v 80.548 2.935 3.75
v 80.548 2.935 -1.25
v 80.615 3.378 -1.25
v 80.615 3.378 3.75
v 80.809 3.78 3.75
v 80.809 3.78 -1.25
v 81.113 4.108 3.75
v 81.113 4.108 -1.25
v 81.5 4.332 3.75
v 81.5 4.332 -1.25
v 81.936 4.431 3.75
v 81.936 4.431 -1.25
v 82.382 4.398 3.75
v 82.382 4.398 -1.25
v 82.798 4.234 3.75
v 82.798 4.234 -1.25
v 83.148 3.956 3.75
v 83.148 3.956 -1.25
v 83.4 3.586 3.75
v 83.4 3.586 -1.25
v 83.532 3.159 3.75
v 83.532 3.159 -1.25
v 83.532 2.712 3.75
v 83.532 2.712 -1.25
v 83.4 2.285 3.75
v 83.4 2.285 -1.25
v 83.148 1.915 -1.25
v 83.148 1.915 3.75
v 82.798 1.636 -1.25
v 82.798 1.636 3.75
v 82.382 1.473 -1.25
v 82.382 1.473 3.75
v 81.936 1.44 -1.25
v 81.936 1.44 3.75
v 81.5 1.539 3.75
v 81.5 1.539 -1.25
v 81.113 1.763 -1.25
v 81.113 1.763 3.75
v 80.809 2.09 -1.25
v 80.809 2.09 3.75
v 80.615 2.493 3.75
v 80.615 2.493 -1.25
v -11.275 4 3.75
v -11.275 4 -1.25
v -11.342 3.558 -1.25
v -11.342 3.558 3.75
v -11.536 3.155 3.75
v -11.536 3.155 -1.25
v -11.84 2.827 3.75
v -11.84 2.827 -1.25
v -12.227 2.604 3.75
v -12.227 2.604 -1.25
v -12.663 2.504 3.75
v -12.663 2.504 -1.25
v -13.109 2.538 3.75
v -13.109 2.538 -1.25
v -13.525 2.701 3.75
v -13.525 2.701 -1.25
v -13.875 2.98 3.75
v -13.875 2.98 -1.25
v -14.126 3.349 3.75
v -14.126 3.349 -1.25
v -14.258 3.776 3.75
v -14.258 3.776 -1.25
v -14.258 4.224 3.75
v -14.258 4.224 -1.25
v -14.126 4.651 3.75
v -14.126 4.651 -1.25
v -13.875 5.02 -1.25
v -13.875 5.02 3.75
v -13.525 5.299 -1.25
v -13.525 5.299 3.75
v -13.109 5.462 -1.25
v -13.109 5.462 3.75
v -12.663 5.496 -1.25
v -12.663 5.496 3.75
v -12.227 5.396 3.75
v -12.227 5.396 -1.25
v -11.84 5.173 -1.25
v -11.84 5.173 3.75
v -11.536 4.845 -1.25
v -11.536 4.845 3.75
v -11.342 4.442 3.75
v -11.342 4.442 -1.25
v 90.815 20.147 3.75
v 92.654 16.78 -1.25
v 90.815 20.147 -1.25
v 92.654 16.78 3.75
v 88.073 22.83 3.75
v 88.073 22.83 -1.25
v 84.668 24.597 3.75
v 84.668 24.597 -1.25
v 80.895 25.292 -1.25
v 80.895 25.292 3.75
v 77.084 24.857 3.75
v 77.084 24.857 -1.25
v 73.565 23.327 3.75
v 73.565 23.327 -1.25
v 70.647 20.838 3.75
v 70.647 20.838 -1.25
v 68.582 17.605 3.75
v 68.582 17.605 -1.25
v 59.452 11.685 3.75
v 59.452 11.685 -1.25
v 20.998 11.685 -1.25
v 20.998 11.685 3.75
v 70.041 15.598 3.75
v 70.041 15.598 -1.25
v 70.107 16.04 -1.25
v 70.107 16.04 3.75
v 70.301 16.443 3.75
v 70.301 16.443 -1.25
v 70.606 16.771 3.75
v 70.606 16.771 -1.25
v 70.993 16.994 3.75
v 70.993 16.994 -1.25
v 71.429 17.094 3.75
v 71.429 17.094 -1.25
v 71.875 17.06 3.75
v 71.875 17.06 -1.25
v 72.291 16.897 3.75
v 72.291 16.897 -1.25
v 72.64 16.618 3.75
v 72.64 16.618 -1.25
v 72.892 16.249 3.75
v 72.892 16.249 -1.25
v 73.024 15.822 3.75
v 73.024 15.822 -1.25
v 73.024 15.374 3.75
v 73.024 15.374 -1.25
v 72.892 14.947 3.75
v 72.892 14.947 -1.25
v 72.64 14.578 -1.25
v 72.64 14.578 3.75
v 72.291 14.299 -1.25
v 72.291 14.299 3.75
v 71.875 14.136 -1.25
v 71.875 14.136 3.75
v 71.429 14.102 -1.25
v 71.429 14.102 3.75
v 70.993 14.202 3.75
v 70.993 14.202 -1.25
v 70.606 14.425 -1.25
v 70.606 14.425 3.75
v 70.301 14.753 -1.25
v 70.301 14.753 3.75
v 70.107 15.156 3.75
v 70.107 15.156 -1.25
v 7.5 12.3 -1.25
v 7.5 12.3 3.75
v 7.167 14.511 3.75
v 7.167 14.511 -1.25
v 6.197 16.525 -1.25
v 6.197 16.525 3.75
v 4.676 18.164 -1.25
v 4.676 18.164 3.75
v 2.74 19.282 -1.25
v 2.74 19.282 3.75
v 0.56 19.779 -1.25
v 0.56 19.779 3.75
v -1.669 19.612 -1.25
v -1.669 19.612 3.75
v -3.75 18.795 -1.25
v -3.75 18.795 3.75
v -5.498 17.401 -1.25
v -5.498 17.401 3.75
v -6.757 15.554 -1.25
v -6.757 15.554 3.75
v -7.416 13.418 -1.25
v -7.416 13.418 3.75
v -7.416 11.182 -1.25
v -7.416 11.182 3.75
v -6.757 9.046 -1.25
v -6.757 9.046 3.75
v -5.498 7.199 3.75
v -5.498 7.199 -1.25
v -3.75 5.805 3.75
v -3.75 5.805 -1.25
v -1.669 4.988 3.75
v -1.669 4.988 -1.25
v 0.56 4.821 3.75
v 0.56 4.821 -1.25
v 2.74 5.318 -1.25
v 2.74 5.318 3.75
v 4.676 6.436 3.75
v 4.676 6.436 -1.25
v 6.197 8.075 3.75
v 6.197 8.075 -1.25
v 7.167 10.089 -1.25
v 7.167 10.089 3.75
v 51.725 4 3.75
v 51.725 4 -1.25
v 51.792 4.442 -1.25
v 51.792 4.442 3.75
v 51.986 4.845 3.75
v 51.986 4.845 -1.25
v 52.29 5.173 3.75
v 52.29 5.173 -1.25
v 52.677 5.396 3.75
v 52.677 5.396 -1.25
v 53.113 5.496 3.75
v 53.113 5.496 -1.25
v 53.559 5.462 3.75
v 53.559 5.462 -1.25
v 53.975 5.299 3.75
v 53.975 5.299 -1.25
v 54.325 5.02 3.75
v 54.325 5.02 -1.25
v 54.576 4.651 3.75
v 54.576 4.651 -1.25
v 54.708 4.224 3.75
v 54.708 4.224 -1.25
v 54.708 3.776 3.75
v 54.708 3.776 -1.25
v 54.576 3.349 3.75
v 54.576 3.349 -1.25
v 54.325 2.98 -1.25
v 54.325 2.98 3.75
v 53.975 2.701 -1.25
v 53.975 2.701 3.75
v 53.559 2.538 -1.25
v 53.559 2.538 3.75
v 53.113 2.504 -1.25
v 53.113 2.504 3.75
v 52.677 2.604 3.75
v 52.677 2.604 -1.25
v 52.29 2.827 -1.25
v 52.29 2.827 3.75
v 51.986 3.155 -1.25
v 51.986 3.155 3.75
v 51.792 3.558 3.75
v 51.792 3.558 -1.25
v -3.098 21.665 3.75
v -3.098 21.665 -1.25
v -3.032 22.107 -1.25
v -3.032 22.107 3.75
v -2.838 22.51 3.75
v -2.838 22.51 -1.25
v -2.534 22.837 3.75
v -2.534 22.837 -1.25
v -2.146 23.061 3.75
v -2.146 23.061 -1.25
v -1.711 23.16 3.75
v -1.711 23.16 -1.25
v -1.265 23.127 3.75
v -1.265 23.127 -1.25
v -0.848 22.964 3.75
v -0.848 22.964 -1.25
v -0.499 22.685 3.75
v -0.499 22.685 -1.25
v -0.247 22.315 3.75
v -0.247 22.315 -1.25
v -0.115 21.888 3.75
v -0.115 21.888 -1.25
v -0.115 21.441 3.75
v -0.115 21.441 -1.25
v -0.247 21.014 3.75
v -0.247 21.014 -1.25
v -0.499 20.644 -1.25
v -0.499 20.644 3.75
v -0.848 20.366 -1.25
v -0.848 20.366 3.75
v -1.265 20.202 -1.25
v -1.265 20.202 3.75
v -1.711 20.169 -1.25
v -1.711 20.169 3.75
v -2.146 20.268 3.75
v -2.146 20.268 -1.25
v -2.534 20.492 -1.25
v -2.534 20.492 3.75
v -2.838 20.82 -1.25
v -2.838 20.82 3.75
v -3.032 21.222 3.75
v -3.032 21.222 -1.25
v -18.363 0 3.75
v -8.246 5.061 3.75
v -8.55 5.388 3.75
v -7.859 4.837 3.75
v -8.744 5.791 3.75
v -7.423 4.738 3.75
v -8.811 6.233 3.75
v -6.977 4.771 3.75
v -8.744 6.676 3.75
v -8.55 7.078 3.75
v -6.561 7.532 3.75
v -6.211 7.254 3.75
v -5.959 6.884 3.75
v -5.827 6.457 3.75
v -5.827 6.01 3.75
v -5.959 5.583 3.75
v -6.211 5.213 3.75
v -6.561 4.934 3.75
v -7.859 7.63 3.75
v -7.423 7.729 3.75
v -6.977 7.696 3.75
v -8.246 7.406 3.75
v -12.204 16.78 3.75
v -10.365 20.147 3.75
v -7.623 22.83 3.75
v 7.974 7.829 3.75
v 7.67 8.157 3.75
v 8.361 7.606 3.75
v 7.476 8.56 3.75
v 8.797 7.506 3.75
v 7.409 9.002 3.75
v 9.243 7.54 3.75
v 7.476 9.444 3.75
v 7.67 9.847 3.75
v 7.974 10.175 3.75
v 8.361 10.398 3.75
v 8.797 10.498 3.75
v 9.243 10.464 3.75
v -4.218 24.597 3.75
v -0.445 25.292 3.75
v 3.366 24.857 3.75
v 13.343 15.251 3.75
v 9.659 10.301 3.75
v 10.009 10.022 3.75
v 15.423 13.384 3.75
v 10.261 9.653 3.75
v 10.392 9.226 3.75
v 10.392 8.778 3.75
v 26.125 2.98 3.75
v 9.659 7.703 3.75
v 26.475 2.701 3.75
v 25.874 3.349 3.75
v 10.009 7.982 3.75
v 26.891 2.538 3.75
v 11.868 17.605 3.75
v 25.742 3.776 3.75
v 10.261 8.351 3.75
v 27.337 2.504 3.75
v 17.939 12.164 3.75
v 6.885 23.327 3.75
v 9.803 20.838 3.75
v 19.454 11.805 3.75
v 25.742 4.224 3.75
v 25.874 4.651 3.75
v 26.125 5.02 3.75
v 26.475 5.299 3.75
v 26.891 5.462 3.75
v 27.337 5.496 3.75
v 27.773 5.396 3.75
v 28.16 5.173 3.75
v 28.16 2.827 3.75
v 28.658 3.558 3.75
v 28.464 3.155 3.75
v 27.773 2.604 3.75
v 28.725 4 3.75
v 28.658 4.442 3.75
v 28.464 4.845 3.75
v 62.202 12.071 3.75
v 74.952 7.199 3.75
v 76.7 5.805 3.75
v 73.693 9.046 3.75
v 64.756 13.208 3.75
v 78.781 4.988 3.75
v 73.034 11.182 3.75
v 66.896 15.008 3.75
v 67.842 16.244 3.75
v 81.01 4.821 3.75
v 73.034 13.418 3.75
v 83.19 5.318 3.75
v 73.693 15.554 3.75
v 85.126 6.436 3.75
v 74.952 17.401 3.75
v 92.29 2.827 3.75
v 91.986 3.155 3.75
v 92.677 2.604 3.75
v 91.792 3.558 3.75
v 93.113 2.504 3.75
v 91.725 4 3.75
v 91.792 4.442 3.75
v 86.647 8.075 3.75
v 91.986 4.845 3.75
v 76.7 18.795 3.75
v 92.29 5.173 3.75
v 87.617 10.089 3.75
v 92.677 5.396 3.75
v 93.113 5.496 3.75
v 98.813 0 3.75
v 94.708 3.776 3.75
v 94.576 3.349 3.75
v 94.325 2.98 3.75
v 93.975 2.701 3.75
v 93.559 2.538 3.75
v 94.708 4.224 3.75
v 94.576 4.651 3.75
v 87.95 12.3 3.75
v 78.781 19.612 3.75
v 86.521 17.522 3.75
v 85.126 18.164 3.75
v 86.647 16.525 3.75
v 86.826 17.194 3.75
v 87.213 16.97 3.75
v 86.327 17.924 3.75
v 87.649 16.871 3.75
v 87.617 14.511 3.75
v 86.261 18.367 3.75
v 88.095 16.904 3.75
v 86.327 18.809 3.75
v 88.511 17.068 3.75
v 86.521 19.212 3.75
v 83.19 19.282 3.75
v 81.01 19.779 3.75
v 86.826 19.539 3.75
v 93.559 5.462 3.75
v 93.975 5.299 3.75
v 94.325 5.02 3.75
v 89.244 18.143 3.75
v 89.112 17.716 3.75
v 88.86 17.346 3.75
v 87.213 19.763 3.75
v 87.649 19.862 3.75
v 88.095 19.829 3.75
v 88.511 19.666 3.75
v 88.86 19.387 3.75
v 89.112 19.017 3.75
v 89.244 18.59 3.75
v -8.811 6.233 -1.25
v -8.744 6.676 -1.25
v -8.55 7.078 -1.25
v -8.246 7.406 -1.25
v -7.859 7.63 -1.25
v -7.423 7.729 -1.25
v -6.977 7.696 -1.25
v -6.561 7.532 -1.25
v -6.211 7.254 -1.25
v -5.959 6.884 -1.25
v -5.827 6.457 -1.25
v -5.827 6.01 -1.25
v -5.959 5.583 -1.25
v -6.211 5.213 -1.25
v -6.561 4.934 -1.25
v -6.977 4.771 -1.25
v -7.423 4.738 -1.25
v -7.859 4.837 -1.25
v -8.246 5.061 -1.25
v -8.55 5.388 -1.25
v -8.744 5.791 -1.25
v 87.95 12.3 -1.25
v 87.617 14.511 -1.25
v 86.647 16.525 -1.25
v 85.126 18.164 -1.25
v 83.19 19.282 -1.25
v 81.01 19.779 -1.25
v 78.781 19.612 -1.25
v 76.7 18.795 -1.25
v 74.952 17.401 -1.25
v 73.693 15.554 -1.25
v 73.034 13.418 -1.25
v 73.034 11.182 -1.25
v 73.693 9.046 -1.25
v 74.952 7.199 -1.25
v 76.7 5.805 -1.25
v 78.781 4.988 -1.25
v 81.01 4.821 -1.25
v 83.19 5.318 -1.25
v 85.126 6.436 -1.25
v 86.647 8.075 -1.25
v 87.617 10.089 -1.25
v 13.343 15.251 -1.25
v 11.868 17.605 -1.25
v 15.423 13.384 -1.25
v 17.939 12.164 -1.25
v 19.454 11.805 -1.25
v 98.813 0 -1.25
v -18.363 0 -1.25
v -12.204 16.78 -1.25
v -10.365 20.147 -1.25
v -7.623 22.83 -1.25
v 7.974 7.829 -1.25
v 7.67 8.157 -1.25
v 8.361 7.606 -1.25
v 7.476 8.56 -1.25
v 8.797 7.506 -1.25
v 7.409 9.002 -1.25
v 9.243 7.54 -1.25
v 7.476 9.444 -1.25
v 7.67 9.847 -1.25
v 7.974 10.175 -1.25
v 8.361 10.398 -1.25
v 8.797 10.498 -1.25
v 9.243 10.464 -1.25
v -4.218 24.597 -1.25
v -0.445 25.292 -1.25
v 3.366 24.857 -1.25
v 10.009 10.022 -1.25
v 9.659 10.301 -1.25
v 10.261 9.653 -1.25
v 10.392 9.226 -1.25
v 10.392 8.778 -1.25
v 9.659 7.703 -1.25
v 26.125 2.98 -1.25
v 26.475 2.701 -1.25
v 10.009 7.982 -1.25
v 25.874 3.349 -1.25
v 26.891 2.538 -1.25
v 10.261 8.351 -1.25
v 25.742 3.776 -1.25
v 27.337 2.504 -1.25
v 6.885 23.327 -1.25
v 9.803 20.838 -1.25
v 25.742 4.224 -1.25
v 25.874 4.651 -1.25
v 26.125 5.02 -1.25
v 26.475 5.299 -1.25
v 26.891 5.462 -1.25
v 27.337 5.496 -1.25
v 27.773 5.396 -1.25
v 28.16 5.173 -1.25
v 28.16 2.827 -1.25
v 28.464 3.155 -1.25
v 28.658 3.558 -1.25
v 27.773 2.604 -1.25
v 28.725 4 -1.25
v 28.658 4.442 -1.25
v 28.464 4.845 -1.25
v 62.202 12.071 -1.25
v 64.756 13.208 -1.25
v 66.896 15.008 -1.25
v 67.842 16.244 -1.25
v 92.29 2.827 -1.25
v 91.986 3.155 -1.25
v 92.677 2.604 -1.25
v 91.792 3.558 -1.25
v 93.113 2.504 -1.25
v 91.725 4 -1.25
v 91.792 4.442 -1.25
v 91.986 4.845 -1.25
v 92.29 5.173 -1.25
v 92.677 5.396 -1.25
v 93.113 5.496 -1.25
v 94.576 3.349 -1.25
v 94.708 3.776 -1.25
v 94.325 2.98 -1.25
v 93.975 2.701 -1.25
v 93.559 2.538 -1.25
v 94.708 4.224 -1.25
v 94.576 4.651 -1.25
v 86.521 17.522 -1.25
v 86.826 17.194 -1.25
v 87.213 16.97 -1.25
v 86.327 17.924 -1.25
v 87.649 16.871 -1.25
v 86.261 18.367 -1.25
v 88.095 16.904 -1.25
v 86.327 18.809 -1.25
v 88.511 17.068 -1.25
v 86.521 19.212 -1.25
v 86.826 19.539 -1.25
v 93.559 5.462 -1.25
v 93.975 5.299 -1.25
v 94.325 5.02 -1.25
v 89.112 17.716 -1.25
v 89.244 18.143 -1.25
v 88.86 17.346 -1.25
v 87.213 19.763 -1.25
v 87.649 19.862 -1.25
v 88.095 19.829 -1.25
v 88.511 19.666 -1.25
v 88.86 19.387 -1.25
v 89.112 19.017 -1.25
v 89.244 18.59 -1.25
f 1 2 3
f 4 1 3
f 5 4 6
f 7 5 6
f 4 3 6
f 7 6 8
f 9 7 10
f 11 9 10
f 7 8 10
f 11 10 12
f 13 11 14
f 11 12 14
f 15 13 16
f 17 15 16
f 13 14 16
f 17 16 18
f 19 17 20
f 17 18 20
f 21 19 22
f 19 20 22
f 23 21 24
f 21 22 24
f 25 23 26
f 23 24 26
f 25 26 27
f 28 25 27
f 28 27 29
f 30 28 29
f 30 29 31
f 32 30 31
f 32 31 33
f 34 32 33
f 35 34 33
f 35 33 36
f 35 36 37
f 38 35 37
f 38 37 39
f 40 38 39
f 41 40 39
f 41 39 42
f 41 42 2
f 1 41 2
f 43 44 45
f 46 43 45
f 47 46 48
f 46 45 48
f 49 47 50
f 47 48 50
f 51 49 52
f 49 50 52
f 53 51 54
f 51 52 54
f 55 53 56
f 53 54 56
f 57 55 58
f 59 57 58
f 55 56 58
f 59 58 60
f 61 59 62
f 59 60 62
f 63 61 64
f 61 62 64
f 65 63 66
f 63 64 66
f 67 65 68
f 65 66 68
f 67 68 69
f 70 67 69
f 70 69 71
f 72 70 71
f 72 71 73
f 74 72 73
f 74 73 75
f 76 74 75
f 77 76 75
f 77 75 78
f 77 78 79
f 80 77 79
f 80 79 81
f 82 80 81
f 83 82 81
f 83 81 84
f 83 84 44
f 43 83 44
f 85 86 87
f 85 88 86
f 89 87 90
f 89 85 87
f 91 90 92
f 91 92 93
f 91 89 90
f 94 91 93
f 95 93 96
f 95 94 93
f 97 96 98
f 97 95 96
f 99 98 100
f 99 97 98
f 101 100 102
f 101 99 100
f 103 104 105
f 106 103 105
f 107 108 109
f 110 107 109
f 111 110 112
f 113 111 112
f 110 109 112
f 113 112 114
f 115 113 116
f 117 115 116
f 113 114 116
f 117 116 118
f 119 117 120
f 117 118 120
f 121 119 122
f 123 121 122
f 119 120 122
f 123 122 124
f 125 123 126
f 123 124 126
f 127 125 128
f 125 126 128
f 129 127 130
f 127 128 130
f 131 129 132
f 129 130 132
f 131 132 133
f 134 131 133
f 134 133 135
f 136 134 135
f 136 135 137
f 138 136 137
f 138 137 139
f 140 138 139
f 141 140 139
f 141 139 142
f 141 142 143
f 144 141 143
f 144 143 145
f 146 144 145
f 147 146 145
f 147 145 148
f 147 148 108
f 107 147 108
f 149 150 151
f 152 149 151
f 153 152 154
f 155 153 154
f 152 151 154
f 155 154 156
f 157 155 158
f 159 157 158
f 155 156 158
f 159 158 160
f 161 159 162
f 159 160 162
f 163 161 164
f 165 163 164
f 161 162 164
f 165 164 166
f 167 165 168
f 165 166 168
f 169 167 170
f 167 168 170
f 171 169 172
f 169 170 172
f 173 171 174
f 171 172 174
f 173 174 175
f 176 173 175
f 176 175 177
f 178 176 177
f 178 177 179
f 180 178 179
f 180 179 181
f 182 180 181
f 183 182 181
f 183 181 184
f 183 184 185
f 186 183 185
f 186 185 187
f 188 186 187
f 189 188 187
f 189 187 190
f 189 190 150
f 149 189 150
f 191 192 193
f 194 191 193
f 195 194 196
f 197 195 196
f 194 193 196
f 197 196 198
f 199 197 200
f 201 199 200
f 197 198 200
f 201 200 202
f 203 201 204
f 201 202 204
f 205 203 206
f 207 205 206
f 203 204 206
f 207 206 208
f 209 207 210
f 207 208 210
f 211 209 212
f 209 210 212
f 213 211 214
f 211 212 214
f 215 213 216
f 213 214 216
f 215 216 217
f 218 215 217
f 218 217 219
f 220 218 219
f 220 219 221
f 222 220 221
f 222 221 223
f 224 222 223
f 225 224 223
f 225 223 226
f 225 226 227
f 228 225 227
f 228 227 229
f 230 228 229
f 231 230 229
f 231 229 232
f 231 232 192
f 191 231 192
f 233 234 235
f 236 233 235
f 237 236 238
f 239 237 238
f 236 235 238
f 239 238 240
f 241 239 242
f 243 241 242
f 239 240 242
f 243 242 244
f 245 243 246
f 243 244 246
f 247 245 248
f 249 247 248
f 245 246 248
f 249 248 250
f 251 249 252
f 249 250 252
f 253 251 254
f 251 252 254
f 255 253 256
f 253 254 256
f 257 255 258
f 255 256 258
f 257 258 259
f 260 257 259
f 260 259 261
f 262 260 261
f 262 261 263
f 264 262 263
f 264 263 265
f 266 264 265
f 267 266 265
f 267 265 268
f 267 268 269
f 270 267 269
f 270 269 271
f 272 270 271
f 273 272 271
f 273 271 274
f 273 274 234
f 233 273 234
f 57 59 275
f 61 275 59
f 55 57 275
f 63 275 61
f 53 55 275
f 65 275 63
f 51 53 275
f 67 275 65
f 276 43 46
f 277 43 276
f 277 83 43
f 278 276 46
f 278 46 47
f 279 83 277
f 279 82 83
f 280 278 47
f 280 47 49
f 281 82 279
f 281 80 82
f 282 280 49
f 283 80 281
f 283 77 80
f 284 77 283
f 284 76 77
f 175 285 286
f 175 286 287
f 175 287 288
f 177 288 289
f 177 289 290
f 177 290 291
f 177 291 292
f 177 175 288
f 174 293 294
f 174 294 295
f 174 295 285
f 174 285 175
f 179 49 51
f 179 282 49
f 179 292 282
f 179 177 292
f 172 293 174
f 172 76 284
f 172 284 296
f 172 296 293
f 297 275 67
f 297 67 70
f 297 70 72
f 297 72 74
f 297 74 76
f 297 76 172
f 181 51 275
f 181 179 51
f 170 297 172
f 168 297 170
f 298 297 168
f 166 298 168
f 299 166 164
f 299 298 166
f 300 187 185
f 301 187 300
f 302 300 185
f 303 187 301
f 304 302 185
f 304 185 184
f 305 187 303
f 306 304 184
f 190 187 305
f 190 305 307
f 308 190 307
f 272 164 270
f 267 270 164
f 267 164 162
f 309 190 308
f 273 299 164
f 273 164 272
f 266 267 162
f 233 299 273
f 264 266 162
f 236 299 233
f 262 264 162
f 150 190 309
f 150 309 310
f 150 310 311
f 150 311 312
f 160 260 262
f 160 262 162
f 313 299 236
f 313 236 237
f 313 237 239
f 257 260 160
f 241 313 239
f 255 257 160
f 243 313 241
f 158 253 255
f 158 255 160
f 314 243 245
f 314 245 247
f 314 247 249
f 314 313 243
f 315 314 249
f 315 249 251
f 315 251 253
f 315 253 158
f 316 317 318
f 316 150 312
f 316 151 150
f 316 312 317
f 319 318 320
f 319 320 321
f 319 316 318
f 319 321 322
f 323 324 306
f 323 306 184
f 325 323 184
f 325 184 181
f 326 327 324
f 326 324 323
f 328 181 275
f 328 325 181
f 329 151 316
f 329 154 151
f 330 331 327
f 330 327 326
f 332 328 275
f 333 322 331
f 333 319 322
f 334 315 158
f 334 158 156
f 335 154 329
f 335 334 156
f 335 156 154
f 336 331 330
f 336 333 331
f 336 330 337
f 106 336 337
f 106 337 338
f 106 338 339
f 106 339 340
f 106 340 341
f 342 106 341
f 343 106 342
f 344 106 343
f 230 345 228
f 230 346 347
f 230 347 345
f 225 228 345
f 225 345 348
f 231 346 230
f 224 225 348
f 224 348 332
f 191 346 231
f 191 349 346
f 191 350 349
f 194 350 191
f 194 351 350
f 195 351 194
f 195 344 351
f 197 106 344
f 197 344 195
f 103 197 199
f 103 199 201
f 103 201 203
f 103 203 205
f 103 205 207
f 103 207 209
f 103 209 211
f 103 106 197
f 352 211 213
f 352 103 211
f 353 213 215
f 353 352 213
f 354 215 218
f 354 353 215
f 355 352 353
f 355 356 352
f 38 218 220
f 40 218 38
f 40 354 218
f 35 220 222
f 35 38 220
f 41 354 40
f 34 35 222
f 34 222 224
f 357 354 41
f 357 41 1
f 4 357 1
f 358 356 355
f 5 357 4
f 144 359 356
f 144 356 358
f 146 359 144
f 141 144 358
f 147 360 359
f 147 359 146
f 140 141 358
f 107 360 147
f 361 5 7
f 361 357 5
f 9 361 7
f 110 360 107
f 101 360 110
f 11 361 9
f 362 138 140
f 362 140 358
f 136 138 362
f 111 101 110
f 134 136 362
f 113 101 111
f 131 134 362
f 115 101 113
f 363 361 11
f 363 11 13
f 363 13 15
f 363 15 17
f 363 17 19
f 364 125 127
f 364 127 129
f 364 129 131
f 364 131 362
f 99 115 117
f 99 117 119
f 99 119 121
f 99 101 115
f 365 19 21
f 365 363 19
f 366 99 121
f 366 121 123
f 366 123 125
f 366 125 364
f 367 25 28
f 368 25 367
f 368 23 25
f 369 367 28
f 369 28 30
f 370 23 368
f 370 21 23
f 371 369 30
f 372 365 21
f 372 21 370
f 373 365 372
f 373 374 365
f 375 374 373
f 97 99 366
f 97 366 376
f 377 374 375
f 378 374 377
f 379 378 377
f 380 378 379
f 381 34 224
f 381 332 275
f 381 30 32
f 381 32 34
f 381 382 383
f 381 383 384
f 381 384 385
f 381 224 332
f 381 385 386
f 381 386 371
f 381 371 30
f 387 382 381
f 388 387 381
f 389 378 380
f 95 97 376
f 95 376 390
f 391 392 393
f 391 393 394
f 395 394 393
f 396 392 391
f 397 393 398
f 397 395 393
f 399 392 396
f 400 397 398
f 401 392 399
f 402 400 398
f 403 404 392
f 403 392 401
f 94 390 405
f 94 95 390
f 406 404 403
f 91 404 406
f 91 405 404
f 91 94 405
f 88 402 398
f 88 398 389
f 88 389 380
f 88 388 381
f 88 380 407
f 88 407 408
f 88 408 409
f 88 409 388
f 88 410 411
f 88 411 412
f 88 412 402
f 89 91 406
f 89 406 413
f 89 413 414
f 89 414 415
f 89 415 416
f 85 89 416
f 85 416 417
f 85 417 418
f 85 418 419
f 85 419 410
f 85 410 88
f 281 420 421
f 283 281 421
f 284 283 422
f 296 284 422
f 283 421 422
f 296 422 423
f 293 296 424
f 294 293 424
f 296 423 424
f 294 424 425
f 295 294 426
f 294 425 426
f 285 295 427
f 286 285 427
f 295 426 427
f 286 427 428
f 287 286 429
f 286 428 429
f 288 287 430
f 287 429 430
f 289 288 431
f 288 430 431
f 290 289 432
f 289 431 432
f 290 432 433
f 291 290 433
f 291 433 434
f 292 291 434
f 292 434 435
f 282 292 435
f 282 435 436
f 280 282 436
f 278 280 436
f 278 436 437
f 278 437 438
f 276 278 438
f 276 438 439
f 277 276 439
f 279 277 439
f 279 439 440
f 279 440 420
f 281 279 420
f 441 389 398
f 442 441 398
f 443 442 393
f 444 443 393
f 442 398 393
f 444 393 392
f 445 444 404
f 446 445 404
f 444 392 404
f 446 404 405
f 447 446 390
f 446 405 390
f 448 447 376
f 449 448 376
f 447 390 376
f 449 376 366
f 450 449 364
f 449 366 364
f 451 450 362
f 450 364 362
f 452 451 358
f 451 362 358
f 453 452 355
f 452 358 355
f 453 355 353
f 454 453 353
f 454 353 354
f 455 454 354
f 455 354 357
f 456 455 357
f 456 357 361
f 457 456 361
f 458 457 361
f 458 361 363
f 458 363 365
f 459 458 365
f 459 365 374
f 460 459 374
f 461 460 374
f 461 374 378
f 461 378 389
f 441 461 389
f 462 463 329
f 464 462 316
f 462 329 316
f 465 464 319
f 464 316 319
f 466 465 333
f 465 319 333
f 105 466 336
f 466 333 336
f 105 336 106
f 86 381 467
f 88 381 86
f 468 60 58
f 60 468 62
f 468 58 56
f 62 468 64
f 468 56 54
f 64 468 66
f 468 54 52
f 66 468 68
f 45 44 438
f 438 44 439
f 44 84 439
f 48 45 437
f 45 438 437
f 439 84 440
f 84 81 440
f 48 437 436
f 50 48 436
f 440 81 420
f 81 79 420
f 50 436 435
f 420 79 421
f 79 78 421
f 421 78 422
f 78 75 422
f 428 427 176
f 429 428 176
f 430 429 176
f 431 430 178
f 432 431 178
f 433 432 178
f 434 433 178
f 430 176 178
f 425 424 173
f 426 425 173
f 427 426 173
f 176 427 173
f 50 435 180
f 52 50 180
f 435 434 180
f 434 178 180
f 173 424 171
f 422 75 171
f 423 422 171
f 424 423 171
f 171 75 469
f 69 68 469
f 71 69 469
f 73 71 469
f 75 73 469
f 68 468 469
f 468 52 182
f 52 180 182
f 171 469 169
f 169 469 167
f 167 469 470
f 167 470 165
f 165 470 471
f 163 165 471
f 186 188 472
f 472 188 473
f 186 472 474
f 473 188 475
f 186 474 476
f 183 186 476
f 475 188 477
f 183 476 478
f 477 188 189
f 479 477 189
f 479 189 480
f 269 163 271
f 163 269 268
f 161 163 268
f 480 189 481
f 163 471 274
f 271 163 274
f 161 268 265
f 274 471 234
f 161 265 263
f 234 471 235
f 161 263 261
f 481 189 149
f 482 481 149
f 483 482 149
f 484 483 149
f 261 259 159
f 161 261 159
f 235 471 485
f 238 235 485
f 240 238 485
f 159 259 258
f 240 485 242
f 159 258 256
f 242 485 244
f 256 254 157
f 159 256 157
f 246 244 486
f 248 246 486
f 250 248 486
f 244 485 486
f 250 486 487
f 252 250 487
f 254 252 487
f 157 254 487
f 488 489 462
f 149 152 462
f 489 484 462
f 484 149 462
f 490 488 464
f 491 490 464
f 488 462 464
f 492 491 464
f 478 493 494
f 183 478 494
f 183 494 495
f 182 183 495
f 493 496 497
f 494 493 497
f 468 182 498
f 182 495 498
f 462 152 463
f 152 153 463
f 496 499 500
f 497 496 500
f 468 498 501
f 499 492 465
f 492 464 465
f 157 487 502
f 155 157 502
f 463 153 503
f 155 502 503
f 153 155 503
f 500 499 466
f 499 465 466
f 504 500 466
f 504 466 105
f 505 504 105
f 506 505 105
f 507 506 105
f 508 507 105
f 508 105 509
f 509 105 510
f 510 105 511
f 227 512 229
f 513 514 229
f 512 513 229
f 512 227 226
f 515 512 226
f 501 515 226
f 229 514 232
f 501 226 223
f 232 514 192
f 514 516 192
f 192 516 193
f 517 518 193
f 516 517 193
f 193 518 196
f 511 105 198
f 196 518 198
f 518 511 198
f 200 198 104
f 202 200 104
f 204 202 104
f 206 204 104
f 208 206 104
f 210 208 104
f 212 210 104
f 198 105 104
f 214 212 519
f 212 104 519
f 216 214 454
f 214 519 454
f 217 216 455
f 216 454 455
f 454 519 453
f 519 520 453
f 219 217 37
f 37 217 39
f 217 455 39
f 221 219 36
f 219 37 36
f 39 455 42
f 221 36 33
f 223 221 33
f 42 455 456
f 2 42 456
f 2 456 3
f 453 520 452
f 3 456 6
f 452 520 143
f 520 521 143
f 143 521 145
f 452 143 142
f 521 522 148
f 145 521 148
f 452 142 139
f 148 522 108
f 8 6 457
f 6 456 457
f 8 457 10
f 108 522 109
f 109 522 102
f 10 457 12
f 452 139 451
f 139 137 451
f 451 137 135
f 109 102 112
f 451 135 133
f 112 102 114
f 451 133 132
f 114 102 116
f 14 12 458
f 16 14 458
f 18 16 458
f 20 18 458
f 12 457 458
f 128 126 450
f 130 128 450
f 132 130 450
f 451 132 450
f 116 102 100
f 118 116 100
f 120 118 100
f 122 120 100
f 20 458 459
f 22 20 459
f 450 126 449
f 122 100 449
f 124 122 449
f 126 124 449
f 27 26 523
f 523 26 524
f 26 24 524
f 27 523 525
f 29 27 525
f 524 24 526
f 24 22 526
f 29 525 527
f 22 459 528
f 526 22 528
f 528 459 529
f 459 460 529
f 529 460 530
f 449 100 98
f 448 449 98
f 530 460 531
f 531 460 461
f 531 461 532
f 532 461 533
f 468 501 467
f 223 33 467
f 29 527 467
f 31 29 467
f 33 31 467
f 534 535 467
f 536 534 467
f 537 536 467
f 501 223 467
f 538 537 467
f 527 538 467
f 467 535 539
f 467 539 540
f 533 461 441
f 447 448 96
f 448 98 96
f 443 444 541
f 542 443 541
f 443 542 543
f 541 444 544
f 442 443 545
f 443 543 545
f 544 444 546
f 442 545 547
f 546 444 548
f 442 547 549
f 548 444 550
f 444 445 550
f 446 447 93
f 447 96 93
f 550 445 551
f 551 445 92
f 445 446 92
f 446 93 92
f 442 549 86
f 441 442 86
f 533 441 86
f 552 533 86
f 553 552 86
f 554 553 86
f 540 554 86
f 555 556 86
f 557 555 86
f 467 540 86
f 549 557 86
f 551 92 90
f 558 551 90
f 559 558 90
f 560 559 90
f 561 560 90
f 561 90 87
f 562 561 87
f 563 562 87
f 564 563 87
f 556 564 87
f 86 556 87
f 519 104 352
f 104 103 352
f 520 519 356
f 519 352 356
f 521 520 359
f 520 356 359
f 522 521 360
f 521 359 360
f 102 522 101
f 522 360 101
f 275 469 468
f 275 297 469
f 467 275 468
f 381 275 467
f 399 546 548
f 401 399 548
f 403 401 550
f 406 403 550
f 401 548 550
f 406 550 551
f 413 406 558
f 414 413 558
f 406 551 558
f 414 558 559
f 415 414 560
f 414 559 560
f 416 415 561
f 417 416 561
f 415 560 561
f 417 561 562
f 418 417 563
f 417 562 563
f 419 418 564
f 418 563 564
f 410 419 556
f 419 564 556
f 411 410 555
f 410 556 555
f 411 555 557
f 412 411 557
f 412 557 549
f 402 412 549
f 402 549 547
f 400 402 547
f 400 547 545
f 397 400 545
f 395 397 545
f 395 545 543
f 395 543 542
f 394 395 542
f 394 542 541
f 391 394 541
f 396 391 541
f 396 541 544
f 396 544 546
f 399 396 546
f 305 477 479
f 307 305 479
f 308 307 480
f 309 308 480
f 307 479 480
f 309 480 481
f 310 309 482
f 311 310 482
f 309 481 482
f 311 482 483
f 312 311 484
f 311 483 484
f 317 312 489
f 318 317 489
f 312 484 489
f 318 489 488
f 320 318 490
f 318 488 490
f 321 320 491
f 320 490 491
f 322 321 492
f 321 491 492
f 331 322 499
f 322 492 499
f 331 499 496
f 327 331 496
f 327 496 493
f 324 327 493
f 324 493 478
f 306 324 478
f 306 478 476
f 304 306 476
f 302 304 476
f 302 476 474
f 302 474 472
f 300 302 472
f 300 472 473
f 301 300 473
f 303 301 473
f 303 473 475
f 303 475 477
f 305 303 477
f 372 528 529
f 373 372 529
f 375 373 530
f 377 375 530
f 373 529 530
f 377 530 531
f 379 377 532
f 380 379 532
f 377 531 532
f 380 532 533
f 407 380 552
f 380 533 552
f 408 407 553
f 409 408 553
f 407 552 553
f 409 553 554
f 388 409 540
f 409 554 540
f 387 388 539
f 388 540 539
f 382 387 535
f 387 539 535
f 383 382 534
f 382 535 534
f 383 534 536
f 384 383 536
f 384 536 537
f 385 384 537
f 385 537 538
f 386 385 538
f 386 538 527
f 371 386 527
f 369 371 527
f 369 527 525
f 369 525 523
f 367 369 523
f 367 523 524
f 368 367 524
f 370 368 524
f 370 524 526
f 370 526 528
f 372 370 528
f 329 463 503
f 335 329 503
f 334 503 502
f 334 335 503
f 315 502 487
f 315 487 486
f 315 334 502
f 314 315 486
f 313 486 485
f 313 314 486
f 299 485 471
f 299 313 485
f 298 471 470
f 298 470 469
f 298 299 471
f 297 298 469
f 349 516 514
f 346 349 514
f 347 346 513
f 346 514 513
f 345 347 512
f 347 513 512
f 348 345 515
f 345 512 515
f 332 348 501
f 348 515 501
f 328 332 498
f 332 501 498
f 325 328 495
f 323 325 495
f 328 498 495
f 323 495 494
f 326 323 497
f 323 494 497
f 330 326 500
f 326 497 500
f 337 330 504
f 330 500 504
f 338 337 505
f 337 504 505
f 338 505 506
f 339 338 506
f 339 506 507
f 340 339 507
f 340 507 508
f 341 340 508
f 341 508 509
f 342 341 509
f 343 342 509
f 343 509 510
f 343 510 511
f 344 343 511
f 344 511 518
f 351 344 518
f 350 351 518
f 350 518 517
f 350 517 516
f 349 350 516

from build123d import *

# Parameters (mm, degrees)
EXTRUDE_START          = 1.25
EXTRUDE_1_DEPTH        = 2.5
SKETCH_2_R             = 7.5
CUT_EXTRUDE_1_DEPTH    = 32.659095027
PATTERN_LINEAR_1_COUNT = 2
PATTERN_LINEAR_1_PITCH = 80.45
SKETCH_3_W             = 52.302227504
SKETCH_3_H             = 11.68512329
EXTRUDE_2_DEPTH        = 5
FILLET_1_R             = 10
SKETCH_4_R             = 1.5
CUT_EXTRUDE_2_DEPTH    = 103.123184877
SKETCH_5_R             = 1.5
CUT_EXTRUDE_3_DEPTH    = 103.123184877


with BuildPart() as part:
    # 草图1 → 凸台-拉伸1 (new, symmetric)
    with BuildSketch(Plane.XY.offset(EXTRUDE_START)):
        with BuildLine():
            Line((-18.36323223, 0), (18.36323223, 0))
            Line((18.36323223, 0), (12.203770764, 16.779729806))
            ThreePointArc((12.203770764, 16.779729806), (0, 25.3), (-12.203770764, 16.779729806))
            Line((-12.203770764, 16.779729806), (-18.36323223, 0))
        make_face()
    extrude(amount=EXTRUDE_1_DEPTH, both=True)

    # 草图2 → 切除-拉伸1 (cut, through all)
    with BuildSketch(Plane.XY.offset(3.75)):
        with Locations((0, 12.3)):
            Circle(SKETCH_2_R)
    extrude(amount=-CUT_EXTRUDE_1_DEPTH, mode=Mode.SUBTRACT)


with BuildPart() as pattern_linear_1_1:
    # 阵列(线性)1: pattern copy
    add(part.part.moved(Location(Vector(1, 0, 0) * (1 * PATTERN_LINEAR_1_PITCH))))


with BuildPart() as part_1:
    add(part.part)

    add(pattern_linear_1_1.part)  # 凸台-拉伸2 merges 阵列(线性)1_1
    # 草图3 → 凸台-拉伸2 (add)
    with BuildSketch(Plane(origin=(0, 0, -1.25), x_dir=(-1, 0, 0), z_dir=(0, 0, -1))):
        with Locations((-40.225, 5.842561645)):
            Rectangle(SKETCH_3_W, SKETCH_3_H)
    extrude(amount=-EXTRUDE_2_DEPTH)

    # 圆角1
    fillet_1_edges = [part_1.edges().sort_by_distance(p)[0] for p in [
        (14.073886248, 11.68512329, 1.25),
        (66.376113752, 11.68512329, 1.25),
    ]]
    fillet(fillet_1_edges, radius=FILLET_1_R)

    # 草图4 → 切除-拉伸2 (cut, through all)
    with BuildSketch(Plane(origin=(0, 0, -1.25), x_dir=(-1, 0, 0), z_dir=(0, 0, -1))):
        with Locations((1.598414444, 21.66456466)):
            Circle(SKETCH_4_R)
        with Locations((7.310743669, 6.233450156)):
            Circle(SKETCH_4_R)
        with Locations((-8.909158113, 9.001985185)):
            Circle(SKETCH_4_R)
        with Locations((-71.540841887, 15.598014815)):
            Circle(SKETCH_4_R)
        with Locations((-82.048414444, 2.93543534)):
            Circle(SKETCH_4_R)
        with Locations((-87.760743669, 18.366549844)):
            Circle(SKETCH_4_R)
    extrude(amount=-CUT_EXTRUDE_2_DEPTH, mode=Mode.SUBTRACT)

    # 草图5 → 切除-拉伸3 (cut, through all)
    with BuildSketch(Plane(origin=(0, 0, -1.25), x_dir=(-1, 0, 0), z_dir=(0, 0, -1))):
        with Locations((-93.225, 4)):
            Circle(SKETCH_5_R)
        with Locations((-53.225, 4)):
            Circle(SKETCH_5_R)
        with Locations(Location((12.775, 4, 0), (0, 0, 180))):
            Circle(SKETCH_5_R)
        with Locations(Location((-27.225, 4, 0), (0, 0, 180))):
            Circle(SKETCH_5_R)
    extrude(amount=-CUT_EXTRUDE_3_DEPTH, mode=Mode.SUBTRACT)


solid = part_1.part
